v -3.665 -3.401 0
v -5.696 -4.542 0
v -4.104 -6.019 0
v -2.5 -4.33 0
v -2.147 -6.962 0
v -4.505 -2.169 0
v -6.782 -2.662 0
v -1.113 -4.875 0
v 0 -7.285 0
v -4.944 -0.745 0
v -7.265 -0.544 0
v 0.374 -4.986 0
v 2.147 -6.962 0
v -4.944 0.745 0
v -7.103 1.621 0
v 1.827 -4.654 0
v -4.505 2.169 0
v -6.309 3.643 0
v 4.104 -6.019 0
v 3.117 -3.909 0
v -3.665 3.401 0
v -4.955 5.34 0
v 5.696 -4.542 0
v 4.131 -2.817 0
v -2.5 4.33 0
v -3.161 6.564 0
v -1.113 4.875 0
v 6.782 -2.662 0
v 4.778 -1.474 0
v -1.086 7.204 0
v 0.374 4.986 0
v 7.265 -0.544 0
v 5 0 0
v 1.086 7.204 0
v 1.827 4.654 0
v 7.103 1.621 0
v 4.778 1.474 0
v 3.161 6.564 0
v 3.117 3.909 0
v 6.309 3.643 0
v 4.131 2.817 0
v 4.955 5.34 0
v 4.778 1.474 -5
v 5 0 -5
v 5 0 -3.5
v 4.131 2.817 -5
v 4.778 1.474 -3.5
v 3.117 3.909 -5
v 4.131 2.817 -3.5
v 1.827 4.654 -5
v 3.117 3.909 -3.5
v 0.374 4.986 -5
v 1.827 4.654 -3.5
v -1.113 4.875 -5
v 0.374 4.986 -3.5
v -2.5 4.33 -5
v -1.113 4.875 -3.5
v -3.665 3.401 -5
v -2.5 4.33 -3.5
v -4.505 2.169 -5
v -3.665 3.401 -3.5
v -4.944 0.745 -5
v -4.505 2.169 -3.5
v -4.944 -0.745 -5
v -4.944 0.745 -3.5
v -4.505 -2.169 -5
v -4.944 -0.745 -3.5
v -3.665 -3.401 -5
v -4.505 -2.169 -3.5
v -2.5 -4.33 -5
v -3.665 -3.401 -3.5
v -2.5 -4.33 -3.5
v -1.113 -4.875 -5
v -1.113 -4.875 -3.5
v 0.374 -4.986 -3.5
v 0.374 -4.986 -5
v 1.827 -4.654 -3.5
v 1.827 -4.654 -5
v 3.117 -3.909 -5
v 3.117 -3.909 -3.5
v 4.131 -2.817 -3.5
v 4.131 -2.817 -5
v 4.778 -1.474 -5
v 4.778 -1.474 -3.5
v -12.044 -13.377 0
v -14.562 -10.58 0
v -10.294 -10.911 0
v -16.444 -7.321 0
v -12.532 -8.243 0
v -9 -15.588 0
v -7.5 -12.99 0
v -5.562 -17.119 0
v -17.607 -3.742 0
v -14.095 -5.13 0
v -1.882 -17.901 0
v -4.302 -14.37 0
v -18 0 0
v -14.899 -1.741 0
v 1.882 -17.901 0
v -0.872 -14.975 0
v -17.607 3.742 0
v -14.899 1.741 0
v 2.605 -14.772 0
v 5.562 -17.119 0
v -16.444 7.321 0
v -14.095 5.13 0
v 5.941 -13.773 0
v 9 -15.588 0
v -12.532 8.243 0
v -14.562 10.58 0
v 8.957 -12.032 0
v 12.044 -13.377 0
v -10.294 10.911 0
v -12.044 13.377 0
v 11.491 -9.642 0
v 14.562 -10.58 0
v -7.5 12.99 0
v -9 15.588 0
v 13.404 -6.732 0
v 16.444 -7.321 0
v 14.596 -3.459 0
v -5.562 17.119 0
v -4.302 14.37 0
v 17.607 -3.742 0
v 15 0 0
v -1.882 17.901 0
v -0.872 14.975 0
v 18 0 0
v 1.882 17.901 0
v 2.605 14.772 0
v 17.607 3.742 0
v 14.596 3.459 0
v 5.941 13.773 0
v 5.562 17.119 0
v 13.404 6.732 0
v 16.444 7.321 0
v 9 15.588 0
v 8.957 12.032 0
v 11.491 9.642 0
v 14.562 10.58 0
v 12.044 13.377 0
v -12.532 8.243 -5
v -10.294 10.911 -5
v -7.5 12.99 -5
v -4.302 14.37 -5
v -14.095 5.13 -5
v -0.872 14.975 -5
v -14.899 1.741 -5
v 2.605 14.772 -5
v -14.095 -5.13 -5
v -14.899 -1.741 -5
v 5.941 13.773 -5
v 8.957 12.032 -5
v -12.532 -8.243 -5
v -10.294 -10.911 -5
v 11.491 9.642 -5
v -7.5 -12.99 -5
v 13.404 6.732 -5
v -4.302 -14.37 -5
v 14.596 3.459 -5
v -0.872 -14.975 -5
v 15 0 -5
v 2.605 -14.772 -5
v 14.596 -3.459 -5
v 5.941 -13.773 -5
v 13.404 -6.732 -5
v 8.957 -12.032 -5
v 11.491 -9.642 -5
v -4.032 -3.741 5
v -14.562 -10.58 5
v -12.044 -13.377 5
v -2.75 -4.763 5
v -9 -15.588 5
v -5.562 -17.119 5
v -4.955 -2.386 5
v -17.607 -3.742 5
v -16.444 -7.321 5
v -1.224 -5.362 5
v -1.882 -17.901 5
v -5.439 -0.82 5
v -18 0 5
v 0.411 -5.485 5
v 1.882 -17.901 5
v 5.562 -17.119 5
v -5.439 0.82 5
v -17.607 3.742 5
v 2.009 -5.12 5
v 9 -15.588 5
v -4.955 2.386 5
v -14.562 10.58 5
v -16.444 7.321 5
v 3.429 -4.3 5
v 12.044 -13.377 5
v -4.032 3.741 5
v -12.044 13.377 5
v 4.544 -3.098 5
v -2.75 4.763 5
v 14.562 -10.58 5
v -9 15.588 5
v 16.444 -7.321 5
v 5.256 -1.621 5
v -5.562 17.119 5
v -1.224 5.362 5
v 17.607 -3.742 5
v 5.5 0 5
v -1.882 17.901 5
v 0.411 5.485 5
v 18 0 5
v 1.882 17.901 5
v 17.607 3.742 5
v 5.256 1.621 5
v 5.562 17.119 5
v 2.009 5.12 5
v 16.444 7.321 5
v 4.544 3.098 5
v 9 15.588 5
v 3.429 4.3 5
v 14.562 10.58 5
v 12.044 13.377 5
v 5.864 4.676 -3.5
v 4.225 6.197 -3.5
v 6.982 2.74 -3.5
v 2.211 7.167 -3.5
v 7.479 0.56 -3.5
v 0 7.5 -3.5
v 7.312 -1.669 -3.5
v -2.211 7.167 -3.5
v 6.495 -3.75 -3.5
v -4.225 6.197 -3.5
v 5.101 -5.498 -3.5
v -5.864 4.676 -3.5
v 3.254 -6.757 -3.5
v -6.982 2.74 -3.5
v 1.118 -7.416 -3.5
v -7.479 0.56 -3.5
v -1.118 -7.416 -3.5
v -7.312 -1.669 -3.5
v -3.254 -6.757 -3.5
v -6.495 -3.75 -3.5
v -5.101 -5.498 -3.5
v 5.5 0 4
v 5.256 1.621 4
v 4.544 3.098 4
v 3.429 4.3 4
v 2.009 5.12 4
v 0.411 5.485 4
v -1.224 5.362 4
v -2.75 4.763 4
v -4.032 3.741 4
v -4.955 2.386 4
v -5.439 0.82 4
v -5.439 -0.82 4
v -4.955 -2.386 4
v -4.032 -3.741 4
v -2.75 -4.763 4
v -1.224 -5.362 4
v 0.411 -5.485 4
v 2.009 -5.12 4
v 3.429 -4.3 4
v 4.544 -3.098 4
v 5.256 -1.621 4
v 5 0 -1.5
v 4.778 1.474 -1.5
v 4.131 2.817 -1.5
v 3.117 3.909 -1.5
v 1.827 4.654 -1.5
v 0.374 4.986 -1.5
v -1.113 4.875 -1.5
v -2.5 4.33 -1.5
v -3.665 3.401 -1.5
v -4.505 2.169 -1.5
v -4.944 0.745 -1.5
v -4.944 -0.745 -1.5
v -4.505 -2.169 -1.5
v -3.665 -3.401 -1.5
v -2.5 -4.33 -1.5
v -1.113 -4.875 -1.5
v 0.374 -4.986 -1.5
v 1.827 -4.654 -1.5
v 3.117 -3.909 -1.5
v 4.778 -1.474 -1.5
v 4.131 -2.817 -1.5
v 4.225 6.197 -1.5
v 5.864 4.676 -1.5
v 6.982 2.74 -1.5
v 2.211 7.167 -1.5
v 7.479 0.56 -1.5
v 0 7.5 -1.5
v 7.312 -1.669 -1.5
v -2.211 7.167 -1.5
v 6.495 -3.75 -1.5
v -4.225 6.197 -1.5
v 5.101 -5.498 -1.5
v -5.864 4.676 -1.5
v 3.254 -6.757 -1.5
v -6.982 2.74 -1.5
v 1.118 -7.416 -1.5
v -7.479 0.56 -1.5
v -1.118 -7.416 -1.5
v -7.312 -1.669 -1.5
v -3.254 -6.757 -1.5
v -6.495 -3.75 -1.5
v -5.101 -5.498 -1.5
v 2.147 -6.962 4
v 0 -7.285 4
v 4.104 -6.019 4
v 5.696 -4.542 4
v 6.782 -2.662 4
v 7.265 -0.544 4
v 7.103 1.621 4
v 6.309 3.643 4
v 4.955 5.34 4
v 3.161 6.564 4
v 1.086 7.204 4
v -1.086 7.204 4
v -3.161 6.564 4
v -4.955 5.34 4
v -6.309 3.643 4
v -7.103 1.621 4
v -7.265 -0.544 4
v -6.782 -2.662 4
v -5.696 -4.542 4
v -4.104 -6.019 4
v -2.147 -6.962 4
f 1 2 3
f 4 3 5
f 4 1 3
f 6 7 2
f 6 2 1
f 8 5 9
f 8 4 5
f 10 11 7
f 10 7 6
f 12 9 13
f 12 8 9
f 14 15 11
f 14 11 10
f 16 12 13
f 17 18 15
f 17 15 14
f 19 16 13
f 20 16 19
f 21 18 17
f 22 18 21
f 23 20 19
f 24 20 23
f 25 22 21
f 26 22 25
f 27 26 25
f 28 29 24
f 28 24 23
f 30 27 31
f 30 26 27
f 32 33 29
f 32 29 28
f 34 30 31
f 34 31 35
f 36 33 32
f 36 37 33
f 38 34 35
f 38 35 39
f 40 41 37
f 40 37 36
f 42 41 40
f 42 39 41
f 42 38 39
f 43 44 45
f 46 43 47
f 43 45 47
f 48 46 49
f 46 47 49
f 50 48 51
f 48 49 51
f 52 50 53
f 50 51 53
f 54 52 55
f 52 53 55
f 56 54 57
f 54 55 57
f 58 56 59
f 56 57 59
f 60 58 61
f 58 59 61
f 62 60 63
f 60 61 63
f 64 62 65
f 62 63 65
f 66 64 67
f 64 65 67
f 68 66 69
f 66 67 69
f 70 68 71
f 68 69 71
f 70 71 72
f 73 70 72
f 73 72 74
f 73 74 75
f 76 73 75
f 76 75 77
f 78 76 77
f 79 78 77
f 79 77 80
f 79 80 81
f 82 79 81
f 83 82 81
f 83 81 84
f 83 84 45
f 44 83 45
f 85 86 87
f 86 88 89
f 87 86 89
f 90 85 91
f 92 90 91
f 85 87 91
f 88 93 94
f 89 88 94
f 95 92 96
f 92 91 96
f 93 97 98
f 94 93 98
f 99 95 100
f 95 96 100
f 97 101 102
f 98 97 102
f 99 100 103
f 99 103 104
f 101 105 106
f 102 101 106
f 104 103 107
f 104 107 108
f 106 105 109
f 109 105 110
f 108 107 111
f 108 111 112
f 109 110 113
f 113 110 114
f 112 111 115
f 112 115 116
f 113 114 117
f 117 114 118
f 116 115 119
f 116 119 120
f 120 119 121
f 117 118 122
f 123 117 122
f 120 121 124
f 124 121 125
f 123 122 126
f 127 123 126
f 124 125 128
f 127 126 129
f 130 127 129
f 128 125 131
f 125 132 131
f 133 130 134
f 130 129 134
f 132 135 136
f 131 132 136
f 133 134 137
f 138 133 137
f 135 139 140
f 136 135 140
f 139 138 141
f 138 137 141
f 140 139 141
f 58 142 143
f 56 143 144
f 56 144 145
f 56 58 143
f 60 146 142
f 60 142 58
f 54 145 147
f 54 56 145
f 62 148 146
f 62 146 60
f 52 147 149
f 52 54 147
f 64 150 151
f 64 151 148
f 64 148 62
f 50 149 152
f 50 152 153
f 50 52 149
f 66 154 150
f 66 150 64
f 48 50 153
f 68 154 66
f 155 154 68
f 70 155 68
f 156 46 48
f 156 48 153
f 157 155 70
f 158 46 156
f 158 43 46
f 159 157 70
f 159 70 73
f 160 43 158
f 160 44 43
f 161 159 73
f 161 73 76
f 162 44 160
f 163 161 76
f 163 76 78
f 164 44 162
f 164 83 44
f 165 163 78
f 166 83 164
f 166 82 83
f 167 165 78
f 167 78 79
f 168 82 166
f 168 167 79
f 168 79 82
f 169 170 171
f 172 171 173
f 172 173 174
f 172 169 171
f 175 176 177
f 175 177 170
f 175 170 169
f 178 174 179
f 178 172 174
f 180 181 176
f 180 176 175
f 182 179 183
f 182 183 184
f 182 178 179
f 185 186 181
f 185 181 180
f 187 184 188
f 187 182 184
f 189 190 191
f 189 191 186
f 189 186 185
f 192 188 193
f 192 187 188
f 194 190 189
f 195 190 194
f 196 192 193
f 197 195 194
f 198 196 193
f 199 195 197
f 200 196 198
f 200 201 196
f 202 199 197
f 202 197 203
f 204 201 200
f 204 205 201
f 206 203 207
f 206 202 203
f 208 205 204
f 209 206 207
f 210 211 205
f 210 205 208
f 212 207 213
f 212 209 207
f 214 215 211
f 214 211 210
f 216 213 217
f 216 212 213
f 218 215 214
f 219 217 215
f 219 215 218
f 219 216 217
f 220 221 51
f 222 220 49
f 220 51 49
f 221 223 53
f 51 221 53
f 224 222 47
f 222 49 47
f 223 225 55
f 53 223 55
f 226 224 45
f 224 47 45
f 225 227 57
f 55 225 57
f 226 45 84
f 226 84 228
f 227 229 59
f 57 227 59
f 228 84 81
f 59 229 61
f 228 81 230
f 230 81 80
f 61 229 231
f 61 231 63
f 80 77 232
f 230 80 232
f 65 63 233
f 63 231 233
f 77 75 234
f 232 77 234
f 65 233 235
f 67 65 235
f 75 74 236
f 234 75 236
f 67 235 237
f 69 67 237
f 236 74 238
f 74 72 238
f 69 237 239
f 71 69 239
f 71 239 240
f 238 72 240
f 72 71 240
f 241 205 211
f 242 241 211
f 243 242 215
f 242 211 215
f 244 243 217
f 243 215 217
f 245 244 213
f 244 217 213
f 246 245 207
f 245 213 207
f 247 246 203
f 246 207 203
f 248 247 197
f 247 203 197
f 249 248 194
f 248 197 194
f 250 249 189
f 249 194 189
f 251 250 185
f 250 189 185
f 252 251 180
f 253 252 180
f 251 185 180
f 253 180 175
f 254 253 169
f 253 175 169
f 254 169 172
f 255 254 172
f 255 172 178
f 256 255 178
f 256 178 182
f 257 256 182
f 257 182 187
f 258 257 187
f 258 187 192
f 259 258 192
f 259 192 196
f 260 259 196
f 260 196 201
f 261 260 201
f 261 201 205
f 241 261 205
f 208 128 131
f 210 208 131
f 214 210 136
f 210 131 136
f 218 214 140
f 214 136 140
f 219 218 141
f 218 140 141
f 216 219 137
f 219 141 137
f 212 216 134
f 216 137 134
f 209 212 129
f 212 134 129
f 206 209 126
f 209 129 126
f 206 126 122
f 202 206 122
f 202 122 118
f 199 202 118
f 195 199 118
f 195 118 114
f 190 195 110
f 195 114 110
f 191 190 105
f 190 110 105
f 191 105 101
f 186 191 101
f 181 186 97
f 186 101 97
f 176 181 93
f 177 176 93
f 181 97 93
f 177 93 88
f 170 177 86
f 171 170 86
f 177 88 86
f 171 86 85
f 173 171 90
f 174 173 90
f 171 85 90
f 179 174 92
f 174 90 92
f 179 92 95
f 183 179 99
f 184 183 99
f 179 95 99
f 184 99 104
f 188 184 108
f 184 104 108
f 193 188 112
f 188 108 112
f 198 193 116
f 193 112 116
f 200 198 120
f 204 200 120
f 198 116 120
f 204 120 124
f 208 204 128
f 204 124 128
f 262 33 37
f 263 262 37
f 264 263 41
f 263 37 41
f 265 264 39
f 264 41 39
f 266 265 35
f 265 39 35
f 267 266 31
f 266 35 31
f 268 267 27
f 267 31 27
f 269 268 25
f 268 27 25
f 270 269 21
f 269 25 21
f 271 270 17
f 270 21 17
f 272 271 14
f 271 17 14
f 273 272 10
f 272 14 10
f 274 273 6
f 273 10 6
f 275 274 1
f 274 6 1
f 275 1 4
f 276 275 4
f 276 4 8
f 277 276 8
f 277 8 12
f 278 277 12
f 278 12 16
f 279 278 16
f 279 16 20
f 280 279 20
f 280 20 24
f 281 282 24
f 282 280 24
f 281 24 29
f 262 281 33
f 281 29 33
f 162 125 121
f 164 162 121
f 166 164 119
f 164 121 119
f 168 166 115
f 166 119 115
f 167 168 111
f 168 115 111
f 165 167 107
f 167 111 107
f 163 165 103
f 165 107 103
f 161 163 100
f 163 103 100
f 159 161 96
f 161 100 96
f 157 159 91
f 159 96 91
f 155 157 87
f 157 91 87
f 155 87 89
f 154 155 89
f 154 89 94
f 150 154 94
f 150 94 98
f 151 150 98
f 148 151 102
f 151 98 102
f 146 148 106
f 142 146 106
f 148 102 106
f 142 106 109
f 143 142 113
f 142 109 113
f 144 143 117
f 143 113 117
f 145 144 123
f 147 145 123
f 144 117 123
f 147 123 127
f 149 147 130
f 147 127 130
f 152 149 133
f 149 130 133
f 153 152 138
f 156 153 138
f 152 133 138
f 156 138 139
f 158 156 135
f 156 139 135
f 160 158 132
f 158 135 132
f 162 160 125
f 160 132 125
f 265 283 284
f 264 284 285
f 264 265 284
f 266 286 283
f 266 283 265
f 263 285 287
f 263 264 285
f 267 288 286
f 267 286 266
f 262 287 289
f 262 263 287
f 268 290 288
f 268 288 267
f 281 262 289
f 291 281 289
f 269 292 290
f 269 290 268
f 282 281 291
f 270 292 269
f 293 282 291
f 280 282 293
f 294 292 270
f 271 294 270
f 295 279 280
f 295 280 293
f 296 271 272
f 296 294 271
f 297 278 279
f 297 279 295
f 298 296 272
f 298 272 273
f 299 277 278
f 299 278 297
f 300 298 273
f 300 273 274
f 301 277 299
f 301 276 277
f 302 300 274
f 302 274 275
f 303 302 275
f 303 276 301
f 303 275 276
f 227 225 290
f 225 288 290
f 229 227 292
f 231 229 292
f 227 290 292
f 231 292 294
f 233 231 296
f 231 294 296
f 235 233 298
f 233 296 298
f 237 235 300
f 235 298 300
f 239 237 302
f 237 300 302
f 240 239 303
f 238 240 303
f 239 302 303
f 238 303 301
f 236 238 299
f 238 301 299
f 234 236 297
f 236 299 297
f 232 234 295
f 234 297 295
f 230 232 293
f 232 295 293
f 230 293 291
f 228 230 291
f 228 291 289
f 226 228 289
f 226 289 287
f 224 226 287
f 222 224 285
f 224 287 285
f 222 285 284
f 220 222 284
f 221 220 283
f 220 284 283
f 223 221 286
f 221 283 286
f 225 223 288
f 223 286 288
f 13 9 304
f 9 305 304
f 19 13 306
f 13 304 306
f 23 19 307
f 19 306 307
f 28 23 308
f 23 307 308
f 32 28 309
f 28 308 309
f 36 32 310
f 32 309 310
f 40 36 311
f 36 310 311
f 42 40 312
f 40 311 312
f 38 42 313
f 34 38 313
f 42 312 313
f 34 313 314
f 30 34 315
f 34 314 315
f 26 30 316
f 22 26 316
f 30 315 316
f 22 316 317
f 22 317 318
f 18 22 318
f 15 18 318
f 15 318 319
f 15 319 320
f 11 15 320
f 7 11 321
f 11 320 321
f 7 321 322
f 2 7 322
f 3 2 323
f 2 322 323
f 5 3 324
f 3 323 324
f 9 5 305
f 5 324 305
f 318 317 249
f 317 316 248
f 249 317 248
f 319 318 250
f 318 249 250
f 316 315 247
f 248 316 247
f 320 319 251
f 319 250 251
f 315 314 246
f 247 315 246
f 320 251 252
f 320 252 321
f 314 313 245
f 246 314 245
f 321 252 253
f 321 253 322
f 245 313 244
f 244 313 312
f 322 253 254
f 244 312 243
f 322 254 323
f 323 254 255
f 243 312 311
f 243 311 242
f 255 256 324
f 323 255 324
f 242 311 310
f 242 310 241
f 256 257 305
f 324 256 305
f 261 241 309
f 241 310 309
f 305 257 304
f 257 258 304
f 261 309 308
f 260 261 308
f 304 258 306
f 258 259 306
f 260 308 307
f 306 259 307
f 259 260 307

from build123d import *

# Parameters (mm, degrees)
F0_R     = 18
F1_DEPTH = 5
F2_R     = 15
F3_DEPTH = 5
F4_R     = 5
F5_DEPTH = 10
F6_R     = 5.5
F7_DEPTH = 5
F8_W     = 1.785261
F8_H     = 4
F11_W    = 2.5
F11_H    = 2


with BuildPart() as f1:
    # F0 (on Top) → F1 (new body)
    with BuildSketch(Plane.XY):
        Circle(F0_R)
    extrude(amount=F1_DEPTH)

    # F2 (on face) → F3 (join)
    with BuildSketch(Plane(origin=(0, 0, 0), x_dir=(1, 0, 0), z_dir=(0, 0, -1))):
        Circle(F2_R)
    extrude(amount=F3_DEPTH)

    # F4 (on face) → F5 (cut)
    with BuildSketch(Plane.XY.offset(5)):
        Circle(F4_R)
    extrude(amount=-F5_DEPTH, mode=Mode.SUBTRACT)

    # F6 (on face) → F7 (cut)
    with BuildSketch(Plane.XY.offset(5)):
        Circle(F6_R)
    extrude(amount=-F7_DEPTH, mode=Mode.SUBTRACT)

    # F8 (on Right) → F10 (revolve, cut)
    with BuildSketch(Plane.YZ):
        with Locations((-6.39263, 2)):
            Rectangle(F8_W, F8_H)
    revolve(axis=Axis((0, 0, 2.476329), (0, 0, 1)), mode=Mode.SUBTRACT)

    # F11 (on Right) → F12 (revolve, cut)
    with BuildSketch(Plane.YZ):
        with Locations((6.25, -2.5)):
            Rectangle(F11_W, F11_H)
    revolve(axis=Axis((0, 0, 2.476329), (0, 0, 1)), mode=Mode.SUBTRACT)


solid = f1.part
